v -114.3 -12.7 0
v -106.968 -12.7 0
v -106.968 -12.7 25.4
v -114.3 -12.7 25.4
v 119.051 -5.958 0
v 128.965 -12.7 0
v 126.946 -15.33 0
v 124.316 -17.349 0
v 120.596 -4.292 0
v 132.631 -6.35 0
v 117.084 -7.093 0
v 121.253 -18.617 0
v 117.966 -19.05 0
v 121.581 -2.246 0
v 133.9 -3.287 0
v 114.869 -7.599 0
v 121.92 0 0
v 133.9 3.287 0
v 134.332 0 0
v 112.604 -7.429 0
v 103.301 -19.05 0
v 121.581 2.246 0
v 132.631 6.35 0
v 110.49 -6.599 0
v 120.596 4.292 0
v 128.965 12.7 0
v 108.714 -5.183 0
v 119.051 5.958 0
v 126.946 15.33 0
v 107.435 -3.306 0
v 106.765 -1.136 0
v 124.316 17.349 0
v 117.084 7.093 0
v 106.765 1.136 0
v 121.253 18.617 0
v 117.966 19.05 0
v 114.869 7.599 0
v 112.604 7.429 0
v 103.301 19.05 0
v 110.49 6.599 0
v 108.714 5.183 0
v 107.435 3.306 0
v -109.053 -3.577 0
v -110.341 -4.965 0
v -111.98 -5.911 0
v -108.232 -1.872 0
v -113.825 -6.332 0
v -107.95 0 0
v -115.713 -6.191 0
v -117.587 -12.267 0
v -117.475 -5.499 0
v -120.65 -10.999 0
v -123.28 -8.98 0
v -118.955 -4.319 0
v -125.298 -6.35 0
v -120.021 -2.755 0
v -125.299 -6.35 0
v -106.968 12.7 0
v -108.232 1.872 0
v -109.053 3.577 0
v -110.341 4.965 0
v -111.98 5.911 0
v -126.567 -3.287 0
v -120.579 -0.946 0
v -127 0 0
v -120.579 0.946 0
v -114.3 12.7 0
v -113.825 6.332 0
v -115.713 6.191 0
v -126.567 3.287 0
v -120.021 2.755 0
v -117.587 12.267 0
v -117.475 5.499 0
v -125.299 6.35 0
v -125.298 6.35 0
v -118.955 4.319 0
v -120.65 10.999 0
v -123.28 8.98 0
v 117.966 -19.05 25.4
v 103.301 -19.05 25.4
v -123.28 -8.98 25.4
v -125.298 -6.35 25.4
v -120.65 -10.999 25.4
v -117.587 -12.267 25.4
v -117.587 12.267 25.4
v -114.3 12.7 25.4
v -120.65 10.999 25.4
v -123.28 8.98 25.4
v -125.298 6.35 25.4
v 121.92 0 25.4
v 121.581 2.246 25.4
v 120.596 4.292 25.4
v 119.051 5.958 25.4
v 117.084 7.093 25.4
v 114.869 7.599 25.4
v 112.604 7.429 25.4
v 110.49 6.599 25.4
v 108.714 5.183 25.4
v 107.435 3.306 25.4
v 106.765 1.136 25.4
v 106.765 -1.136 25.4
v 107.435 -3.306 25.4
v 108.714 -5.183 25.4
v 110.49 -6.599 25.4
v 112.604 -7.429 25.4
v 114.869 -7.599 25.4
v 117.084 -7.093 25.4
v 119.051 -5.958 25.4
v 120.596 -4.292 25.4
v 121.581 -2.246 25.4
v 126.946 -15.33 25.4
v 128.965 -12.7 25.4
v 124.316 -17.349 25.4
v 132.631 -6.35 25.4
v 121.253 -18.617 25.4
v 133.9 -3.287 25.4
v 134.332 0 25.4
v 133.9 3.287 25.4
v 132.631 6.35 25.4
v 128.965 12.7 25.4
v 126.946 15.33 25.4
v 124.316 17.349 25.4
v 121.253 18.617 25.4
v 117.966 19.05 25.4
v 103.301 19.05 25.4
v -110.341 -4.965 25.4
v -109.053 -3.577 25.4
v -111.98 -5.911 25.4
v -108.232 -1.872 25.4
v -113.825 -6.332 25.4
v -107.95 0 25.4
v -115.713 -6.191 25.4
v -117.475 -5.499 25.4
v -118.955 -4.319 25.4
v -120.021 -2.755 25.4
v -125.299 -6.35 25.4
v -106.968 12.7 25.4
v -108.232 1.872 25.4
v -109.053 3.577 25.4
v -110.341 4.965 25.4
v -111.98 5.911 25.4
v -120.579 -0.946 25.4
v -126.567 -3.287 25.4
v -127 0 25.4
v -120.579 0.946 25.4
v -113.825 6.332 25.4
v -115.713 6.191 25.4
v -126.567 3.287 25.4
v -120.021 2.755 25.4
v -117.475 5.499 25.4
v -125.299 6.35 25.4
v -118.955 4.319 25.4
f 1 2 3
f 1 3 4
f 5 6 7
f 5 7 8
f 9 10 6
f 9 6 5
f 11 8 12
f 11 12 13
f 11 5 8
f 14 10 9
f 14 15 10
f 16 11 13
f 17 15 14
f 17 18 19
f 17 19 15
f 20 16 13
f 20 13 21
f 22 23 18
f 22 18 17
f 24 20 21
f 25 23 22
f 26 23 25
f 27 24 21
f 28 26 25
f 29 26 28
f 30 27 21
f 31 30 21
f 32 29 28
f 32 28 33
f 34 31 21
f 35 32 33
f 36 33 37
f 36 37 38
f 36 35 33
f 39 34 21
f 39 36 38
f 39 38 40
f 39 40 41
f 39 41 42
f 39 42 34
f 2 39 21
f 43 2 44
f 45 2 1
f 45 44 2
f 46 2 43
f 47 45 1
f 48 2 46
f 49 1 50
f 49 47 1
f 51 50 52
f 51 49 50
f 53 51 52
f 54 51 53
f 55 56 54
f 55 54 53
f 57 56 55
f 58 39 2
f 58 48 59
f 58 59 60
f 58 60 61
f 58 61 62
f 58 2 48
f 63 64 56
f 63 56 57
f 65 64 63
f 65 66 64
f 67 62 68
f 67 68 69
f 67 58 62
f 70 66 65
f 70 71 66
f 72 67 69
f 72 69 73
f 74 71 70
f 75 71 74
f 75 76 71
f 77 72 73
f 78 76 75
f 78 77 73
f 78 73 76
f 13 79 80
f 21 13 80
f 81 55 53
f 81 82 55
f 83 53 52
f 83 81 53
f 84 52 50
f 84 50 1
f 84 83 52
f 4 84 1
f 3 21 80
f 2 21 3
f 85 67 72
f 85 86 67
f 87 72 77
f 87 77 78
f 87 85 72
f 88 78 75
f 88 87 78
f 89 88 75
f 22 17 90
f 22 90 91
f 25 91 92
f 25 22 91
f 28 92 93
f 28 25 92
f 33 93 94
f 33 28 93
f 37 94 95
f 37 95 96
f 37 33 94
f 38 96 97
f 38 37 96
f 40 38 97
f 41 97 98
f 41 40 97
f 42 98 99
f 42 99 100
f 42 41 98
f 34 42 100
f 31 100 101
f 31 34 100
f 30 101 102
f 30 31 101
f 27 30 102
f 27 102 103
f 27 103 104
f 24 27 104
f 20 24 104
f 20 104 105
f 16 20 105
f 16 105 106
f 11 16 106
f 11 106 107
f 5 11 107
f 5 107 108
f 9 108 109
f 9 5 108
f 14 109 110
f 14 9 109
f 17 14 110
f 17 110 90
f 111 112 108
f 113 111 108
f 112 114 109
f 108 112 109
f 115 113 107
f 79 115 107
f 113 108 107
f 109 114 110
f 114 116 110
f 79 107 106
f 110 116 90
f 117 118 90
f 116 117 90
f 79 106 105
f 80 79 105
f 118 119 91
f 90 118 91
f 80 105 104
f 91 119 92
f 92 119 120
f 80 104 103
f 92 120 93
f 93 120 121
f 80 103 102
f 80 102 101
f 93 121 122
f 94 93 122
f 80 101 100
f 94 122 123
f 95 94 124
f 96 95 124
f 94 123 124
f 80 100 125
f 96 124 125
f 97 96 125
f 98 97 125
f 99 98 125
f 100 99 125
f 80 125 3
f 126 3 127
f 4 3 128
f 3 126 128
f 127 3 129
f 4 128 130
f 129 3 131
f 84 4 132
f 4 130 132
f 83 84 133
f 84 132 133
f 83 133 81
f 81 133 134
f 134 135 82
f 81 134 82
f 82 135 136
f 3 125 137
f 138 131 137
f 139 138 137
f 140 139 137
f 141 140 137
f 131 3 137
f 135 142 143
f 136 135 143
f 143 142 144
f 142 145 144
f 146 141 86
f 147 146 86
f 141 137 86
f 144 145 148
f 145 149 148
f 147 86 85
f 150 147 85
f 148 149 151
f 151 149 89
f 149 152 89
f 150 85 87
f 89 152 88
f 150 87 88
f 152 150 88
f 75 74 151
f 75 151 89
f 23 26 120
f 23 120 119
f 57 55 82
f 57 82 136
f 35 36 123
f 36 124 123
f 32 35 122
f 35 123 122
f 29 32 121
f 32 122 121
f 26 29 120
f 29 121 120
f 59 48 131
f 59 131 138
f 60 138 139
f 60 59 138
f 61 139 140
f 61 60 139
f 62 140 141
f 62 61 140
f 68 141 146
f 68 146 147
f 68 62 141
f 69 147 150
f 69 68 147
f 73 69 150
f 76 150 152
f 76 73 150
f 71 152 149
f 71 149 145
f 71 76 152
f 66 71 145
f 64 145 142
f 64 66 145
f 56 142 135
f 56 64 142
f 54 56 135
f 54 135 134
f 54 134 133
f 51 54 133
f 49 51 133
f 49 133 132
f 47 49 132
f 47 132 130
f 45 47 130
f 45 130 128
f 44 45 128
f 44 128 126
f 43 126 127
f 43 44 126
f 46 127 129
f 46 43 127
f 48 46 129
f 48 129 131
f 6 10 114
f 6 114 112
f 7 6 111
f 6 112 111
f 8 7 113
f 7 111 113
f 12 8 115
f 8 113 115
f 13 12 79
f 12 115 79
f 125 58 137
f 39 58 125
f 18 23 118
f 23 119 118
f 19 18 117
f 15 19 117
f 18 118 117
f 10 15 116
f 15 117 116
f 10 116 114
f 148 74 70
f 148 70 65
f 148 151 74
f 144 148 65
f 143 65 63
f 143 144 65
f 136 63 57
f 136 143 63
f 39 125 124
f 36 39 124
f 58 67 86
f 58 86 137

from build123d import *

# Parameters (mm, degrees)
SKETCH1_R           = 6.35
SKETCH1_R_2         = 7.62
BOSS_EXTRUDE1_DEPTH = 25.4
FILLET3_R           = 12.7


with BuildPart() as part:
    # Sketch1 → Boss-Extrude1 (new body)
    with BuildSketch(Plane.XY):
        Polygon((-106.967651581, 12.7), (103.301477372, 19.05), (125.298522628, 19.05), (136.297045256, 0), (125.298522628, -19.05), (103.301477372, -19.05), (-106.967651581, -12.7), (-121.632348419, -12.7), (-128.964696837, 0), (-121.632348419, 12.7), align=None)
        with Locations((-114.3, 0)):
            Circle(SKETCH1_R, mode=Mode.SUBTRACT)
        with Locations((114.3, 0)):
            Circle(SKETCH1_R_2, mode=Mode.SUBTRACT)
    extrude(amount=BOSS_EXTRUDE1_DEPTH)

    # Fillet3
    fillet3_edges = [part.edges().sort_by_distance(p)[0] for p in [
        (-128.964696837, 0, 12.7),
        (-121.632348419, 12.7, 12.7),
        (125.298522628, -19.05, 12.7),
        (136.297045256, 0, 12.7),
        (125.298522628, 19.05, 12.7),
        (-121.632348419, -12.7, 12.7),
    ]]
    fillet(fillet3_edges, radius=FILLET3_R - 0.0001)  # a hair under: the kernel refuses the full size


solid = part.part
